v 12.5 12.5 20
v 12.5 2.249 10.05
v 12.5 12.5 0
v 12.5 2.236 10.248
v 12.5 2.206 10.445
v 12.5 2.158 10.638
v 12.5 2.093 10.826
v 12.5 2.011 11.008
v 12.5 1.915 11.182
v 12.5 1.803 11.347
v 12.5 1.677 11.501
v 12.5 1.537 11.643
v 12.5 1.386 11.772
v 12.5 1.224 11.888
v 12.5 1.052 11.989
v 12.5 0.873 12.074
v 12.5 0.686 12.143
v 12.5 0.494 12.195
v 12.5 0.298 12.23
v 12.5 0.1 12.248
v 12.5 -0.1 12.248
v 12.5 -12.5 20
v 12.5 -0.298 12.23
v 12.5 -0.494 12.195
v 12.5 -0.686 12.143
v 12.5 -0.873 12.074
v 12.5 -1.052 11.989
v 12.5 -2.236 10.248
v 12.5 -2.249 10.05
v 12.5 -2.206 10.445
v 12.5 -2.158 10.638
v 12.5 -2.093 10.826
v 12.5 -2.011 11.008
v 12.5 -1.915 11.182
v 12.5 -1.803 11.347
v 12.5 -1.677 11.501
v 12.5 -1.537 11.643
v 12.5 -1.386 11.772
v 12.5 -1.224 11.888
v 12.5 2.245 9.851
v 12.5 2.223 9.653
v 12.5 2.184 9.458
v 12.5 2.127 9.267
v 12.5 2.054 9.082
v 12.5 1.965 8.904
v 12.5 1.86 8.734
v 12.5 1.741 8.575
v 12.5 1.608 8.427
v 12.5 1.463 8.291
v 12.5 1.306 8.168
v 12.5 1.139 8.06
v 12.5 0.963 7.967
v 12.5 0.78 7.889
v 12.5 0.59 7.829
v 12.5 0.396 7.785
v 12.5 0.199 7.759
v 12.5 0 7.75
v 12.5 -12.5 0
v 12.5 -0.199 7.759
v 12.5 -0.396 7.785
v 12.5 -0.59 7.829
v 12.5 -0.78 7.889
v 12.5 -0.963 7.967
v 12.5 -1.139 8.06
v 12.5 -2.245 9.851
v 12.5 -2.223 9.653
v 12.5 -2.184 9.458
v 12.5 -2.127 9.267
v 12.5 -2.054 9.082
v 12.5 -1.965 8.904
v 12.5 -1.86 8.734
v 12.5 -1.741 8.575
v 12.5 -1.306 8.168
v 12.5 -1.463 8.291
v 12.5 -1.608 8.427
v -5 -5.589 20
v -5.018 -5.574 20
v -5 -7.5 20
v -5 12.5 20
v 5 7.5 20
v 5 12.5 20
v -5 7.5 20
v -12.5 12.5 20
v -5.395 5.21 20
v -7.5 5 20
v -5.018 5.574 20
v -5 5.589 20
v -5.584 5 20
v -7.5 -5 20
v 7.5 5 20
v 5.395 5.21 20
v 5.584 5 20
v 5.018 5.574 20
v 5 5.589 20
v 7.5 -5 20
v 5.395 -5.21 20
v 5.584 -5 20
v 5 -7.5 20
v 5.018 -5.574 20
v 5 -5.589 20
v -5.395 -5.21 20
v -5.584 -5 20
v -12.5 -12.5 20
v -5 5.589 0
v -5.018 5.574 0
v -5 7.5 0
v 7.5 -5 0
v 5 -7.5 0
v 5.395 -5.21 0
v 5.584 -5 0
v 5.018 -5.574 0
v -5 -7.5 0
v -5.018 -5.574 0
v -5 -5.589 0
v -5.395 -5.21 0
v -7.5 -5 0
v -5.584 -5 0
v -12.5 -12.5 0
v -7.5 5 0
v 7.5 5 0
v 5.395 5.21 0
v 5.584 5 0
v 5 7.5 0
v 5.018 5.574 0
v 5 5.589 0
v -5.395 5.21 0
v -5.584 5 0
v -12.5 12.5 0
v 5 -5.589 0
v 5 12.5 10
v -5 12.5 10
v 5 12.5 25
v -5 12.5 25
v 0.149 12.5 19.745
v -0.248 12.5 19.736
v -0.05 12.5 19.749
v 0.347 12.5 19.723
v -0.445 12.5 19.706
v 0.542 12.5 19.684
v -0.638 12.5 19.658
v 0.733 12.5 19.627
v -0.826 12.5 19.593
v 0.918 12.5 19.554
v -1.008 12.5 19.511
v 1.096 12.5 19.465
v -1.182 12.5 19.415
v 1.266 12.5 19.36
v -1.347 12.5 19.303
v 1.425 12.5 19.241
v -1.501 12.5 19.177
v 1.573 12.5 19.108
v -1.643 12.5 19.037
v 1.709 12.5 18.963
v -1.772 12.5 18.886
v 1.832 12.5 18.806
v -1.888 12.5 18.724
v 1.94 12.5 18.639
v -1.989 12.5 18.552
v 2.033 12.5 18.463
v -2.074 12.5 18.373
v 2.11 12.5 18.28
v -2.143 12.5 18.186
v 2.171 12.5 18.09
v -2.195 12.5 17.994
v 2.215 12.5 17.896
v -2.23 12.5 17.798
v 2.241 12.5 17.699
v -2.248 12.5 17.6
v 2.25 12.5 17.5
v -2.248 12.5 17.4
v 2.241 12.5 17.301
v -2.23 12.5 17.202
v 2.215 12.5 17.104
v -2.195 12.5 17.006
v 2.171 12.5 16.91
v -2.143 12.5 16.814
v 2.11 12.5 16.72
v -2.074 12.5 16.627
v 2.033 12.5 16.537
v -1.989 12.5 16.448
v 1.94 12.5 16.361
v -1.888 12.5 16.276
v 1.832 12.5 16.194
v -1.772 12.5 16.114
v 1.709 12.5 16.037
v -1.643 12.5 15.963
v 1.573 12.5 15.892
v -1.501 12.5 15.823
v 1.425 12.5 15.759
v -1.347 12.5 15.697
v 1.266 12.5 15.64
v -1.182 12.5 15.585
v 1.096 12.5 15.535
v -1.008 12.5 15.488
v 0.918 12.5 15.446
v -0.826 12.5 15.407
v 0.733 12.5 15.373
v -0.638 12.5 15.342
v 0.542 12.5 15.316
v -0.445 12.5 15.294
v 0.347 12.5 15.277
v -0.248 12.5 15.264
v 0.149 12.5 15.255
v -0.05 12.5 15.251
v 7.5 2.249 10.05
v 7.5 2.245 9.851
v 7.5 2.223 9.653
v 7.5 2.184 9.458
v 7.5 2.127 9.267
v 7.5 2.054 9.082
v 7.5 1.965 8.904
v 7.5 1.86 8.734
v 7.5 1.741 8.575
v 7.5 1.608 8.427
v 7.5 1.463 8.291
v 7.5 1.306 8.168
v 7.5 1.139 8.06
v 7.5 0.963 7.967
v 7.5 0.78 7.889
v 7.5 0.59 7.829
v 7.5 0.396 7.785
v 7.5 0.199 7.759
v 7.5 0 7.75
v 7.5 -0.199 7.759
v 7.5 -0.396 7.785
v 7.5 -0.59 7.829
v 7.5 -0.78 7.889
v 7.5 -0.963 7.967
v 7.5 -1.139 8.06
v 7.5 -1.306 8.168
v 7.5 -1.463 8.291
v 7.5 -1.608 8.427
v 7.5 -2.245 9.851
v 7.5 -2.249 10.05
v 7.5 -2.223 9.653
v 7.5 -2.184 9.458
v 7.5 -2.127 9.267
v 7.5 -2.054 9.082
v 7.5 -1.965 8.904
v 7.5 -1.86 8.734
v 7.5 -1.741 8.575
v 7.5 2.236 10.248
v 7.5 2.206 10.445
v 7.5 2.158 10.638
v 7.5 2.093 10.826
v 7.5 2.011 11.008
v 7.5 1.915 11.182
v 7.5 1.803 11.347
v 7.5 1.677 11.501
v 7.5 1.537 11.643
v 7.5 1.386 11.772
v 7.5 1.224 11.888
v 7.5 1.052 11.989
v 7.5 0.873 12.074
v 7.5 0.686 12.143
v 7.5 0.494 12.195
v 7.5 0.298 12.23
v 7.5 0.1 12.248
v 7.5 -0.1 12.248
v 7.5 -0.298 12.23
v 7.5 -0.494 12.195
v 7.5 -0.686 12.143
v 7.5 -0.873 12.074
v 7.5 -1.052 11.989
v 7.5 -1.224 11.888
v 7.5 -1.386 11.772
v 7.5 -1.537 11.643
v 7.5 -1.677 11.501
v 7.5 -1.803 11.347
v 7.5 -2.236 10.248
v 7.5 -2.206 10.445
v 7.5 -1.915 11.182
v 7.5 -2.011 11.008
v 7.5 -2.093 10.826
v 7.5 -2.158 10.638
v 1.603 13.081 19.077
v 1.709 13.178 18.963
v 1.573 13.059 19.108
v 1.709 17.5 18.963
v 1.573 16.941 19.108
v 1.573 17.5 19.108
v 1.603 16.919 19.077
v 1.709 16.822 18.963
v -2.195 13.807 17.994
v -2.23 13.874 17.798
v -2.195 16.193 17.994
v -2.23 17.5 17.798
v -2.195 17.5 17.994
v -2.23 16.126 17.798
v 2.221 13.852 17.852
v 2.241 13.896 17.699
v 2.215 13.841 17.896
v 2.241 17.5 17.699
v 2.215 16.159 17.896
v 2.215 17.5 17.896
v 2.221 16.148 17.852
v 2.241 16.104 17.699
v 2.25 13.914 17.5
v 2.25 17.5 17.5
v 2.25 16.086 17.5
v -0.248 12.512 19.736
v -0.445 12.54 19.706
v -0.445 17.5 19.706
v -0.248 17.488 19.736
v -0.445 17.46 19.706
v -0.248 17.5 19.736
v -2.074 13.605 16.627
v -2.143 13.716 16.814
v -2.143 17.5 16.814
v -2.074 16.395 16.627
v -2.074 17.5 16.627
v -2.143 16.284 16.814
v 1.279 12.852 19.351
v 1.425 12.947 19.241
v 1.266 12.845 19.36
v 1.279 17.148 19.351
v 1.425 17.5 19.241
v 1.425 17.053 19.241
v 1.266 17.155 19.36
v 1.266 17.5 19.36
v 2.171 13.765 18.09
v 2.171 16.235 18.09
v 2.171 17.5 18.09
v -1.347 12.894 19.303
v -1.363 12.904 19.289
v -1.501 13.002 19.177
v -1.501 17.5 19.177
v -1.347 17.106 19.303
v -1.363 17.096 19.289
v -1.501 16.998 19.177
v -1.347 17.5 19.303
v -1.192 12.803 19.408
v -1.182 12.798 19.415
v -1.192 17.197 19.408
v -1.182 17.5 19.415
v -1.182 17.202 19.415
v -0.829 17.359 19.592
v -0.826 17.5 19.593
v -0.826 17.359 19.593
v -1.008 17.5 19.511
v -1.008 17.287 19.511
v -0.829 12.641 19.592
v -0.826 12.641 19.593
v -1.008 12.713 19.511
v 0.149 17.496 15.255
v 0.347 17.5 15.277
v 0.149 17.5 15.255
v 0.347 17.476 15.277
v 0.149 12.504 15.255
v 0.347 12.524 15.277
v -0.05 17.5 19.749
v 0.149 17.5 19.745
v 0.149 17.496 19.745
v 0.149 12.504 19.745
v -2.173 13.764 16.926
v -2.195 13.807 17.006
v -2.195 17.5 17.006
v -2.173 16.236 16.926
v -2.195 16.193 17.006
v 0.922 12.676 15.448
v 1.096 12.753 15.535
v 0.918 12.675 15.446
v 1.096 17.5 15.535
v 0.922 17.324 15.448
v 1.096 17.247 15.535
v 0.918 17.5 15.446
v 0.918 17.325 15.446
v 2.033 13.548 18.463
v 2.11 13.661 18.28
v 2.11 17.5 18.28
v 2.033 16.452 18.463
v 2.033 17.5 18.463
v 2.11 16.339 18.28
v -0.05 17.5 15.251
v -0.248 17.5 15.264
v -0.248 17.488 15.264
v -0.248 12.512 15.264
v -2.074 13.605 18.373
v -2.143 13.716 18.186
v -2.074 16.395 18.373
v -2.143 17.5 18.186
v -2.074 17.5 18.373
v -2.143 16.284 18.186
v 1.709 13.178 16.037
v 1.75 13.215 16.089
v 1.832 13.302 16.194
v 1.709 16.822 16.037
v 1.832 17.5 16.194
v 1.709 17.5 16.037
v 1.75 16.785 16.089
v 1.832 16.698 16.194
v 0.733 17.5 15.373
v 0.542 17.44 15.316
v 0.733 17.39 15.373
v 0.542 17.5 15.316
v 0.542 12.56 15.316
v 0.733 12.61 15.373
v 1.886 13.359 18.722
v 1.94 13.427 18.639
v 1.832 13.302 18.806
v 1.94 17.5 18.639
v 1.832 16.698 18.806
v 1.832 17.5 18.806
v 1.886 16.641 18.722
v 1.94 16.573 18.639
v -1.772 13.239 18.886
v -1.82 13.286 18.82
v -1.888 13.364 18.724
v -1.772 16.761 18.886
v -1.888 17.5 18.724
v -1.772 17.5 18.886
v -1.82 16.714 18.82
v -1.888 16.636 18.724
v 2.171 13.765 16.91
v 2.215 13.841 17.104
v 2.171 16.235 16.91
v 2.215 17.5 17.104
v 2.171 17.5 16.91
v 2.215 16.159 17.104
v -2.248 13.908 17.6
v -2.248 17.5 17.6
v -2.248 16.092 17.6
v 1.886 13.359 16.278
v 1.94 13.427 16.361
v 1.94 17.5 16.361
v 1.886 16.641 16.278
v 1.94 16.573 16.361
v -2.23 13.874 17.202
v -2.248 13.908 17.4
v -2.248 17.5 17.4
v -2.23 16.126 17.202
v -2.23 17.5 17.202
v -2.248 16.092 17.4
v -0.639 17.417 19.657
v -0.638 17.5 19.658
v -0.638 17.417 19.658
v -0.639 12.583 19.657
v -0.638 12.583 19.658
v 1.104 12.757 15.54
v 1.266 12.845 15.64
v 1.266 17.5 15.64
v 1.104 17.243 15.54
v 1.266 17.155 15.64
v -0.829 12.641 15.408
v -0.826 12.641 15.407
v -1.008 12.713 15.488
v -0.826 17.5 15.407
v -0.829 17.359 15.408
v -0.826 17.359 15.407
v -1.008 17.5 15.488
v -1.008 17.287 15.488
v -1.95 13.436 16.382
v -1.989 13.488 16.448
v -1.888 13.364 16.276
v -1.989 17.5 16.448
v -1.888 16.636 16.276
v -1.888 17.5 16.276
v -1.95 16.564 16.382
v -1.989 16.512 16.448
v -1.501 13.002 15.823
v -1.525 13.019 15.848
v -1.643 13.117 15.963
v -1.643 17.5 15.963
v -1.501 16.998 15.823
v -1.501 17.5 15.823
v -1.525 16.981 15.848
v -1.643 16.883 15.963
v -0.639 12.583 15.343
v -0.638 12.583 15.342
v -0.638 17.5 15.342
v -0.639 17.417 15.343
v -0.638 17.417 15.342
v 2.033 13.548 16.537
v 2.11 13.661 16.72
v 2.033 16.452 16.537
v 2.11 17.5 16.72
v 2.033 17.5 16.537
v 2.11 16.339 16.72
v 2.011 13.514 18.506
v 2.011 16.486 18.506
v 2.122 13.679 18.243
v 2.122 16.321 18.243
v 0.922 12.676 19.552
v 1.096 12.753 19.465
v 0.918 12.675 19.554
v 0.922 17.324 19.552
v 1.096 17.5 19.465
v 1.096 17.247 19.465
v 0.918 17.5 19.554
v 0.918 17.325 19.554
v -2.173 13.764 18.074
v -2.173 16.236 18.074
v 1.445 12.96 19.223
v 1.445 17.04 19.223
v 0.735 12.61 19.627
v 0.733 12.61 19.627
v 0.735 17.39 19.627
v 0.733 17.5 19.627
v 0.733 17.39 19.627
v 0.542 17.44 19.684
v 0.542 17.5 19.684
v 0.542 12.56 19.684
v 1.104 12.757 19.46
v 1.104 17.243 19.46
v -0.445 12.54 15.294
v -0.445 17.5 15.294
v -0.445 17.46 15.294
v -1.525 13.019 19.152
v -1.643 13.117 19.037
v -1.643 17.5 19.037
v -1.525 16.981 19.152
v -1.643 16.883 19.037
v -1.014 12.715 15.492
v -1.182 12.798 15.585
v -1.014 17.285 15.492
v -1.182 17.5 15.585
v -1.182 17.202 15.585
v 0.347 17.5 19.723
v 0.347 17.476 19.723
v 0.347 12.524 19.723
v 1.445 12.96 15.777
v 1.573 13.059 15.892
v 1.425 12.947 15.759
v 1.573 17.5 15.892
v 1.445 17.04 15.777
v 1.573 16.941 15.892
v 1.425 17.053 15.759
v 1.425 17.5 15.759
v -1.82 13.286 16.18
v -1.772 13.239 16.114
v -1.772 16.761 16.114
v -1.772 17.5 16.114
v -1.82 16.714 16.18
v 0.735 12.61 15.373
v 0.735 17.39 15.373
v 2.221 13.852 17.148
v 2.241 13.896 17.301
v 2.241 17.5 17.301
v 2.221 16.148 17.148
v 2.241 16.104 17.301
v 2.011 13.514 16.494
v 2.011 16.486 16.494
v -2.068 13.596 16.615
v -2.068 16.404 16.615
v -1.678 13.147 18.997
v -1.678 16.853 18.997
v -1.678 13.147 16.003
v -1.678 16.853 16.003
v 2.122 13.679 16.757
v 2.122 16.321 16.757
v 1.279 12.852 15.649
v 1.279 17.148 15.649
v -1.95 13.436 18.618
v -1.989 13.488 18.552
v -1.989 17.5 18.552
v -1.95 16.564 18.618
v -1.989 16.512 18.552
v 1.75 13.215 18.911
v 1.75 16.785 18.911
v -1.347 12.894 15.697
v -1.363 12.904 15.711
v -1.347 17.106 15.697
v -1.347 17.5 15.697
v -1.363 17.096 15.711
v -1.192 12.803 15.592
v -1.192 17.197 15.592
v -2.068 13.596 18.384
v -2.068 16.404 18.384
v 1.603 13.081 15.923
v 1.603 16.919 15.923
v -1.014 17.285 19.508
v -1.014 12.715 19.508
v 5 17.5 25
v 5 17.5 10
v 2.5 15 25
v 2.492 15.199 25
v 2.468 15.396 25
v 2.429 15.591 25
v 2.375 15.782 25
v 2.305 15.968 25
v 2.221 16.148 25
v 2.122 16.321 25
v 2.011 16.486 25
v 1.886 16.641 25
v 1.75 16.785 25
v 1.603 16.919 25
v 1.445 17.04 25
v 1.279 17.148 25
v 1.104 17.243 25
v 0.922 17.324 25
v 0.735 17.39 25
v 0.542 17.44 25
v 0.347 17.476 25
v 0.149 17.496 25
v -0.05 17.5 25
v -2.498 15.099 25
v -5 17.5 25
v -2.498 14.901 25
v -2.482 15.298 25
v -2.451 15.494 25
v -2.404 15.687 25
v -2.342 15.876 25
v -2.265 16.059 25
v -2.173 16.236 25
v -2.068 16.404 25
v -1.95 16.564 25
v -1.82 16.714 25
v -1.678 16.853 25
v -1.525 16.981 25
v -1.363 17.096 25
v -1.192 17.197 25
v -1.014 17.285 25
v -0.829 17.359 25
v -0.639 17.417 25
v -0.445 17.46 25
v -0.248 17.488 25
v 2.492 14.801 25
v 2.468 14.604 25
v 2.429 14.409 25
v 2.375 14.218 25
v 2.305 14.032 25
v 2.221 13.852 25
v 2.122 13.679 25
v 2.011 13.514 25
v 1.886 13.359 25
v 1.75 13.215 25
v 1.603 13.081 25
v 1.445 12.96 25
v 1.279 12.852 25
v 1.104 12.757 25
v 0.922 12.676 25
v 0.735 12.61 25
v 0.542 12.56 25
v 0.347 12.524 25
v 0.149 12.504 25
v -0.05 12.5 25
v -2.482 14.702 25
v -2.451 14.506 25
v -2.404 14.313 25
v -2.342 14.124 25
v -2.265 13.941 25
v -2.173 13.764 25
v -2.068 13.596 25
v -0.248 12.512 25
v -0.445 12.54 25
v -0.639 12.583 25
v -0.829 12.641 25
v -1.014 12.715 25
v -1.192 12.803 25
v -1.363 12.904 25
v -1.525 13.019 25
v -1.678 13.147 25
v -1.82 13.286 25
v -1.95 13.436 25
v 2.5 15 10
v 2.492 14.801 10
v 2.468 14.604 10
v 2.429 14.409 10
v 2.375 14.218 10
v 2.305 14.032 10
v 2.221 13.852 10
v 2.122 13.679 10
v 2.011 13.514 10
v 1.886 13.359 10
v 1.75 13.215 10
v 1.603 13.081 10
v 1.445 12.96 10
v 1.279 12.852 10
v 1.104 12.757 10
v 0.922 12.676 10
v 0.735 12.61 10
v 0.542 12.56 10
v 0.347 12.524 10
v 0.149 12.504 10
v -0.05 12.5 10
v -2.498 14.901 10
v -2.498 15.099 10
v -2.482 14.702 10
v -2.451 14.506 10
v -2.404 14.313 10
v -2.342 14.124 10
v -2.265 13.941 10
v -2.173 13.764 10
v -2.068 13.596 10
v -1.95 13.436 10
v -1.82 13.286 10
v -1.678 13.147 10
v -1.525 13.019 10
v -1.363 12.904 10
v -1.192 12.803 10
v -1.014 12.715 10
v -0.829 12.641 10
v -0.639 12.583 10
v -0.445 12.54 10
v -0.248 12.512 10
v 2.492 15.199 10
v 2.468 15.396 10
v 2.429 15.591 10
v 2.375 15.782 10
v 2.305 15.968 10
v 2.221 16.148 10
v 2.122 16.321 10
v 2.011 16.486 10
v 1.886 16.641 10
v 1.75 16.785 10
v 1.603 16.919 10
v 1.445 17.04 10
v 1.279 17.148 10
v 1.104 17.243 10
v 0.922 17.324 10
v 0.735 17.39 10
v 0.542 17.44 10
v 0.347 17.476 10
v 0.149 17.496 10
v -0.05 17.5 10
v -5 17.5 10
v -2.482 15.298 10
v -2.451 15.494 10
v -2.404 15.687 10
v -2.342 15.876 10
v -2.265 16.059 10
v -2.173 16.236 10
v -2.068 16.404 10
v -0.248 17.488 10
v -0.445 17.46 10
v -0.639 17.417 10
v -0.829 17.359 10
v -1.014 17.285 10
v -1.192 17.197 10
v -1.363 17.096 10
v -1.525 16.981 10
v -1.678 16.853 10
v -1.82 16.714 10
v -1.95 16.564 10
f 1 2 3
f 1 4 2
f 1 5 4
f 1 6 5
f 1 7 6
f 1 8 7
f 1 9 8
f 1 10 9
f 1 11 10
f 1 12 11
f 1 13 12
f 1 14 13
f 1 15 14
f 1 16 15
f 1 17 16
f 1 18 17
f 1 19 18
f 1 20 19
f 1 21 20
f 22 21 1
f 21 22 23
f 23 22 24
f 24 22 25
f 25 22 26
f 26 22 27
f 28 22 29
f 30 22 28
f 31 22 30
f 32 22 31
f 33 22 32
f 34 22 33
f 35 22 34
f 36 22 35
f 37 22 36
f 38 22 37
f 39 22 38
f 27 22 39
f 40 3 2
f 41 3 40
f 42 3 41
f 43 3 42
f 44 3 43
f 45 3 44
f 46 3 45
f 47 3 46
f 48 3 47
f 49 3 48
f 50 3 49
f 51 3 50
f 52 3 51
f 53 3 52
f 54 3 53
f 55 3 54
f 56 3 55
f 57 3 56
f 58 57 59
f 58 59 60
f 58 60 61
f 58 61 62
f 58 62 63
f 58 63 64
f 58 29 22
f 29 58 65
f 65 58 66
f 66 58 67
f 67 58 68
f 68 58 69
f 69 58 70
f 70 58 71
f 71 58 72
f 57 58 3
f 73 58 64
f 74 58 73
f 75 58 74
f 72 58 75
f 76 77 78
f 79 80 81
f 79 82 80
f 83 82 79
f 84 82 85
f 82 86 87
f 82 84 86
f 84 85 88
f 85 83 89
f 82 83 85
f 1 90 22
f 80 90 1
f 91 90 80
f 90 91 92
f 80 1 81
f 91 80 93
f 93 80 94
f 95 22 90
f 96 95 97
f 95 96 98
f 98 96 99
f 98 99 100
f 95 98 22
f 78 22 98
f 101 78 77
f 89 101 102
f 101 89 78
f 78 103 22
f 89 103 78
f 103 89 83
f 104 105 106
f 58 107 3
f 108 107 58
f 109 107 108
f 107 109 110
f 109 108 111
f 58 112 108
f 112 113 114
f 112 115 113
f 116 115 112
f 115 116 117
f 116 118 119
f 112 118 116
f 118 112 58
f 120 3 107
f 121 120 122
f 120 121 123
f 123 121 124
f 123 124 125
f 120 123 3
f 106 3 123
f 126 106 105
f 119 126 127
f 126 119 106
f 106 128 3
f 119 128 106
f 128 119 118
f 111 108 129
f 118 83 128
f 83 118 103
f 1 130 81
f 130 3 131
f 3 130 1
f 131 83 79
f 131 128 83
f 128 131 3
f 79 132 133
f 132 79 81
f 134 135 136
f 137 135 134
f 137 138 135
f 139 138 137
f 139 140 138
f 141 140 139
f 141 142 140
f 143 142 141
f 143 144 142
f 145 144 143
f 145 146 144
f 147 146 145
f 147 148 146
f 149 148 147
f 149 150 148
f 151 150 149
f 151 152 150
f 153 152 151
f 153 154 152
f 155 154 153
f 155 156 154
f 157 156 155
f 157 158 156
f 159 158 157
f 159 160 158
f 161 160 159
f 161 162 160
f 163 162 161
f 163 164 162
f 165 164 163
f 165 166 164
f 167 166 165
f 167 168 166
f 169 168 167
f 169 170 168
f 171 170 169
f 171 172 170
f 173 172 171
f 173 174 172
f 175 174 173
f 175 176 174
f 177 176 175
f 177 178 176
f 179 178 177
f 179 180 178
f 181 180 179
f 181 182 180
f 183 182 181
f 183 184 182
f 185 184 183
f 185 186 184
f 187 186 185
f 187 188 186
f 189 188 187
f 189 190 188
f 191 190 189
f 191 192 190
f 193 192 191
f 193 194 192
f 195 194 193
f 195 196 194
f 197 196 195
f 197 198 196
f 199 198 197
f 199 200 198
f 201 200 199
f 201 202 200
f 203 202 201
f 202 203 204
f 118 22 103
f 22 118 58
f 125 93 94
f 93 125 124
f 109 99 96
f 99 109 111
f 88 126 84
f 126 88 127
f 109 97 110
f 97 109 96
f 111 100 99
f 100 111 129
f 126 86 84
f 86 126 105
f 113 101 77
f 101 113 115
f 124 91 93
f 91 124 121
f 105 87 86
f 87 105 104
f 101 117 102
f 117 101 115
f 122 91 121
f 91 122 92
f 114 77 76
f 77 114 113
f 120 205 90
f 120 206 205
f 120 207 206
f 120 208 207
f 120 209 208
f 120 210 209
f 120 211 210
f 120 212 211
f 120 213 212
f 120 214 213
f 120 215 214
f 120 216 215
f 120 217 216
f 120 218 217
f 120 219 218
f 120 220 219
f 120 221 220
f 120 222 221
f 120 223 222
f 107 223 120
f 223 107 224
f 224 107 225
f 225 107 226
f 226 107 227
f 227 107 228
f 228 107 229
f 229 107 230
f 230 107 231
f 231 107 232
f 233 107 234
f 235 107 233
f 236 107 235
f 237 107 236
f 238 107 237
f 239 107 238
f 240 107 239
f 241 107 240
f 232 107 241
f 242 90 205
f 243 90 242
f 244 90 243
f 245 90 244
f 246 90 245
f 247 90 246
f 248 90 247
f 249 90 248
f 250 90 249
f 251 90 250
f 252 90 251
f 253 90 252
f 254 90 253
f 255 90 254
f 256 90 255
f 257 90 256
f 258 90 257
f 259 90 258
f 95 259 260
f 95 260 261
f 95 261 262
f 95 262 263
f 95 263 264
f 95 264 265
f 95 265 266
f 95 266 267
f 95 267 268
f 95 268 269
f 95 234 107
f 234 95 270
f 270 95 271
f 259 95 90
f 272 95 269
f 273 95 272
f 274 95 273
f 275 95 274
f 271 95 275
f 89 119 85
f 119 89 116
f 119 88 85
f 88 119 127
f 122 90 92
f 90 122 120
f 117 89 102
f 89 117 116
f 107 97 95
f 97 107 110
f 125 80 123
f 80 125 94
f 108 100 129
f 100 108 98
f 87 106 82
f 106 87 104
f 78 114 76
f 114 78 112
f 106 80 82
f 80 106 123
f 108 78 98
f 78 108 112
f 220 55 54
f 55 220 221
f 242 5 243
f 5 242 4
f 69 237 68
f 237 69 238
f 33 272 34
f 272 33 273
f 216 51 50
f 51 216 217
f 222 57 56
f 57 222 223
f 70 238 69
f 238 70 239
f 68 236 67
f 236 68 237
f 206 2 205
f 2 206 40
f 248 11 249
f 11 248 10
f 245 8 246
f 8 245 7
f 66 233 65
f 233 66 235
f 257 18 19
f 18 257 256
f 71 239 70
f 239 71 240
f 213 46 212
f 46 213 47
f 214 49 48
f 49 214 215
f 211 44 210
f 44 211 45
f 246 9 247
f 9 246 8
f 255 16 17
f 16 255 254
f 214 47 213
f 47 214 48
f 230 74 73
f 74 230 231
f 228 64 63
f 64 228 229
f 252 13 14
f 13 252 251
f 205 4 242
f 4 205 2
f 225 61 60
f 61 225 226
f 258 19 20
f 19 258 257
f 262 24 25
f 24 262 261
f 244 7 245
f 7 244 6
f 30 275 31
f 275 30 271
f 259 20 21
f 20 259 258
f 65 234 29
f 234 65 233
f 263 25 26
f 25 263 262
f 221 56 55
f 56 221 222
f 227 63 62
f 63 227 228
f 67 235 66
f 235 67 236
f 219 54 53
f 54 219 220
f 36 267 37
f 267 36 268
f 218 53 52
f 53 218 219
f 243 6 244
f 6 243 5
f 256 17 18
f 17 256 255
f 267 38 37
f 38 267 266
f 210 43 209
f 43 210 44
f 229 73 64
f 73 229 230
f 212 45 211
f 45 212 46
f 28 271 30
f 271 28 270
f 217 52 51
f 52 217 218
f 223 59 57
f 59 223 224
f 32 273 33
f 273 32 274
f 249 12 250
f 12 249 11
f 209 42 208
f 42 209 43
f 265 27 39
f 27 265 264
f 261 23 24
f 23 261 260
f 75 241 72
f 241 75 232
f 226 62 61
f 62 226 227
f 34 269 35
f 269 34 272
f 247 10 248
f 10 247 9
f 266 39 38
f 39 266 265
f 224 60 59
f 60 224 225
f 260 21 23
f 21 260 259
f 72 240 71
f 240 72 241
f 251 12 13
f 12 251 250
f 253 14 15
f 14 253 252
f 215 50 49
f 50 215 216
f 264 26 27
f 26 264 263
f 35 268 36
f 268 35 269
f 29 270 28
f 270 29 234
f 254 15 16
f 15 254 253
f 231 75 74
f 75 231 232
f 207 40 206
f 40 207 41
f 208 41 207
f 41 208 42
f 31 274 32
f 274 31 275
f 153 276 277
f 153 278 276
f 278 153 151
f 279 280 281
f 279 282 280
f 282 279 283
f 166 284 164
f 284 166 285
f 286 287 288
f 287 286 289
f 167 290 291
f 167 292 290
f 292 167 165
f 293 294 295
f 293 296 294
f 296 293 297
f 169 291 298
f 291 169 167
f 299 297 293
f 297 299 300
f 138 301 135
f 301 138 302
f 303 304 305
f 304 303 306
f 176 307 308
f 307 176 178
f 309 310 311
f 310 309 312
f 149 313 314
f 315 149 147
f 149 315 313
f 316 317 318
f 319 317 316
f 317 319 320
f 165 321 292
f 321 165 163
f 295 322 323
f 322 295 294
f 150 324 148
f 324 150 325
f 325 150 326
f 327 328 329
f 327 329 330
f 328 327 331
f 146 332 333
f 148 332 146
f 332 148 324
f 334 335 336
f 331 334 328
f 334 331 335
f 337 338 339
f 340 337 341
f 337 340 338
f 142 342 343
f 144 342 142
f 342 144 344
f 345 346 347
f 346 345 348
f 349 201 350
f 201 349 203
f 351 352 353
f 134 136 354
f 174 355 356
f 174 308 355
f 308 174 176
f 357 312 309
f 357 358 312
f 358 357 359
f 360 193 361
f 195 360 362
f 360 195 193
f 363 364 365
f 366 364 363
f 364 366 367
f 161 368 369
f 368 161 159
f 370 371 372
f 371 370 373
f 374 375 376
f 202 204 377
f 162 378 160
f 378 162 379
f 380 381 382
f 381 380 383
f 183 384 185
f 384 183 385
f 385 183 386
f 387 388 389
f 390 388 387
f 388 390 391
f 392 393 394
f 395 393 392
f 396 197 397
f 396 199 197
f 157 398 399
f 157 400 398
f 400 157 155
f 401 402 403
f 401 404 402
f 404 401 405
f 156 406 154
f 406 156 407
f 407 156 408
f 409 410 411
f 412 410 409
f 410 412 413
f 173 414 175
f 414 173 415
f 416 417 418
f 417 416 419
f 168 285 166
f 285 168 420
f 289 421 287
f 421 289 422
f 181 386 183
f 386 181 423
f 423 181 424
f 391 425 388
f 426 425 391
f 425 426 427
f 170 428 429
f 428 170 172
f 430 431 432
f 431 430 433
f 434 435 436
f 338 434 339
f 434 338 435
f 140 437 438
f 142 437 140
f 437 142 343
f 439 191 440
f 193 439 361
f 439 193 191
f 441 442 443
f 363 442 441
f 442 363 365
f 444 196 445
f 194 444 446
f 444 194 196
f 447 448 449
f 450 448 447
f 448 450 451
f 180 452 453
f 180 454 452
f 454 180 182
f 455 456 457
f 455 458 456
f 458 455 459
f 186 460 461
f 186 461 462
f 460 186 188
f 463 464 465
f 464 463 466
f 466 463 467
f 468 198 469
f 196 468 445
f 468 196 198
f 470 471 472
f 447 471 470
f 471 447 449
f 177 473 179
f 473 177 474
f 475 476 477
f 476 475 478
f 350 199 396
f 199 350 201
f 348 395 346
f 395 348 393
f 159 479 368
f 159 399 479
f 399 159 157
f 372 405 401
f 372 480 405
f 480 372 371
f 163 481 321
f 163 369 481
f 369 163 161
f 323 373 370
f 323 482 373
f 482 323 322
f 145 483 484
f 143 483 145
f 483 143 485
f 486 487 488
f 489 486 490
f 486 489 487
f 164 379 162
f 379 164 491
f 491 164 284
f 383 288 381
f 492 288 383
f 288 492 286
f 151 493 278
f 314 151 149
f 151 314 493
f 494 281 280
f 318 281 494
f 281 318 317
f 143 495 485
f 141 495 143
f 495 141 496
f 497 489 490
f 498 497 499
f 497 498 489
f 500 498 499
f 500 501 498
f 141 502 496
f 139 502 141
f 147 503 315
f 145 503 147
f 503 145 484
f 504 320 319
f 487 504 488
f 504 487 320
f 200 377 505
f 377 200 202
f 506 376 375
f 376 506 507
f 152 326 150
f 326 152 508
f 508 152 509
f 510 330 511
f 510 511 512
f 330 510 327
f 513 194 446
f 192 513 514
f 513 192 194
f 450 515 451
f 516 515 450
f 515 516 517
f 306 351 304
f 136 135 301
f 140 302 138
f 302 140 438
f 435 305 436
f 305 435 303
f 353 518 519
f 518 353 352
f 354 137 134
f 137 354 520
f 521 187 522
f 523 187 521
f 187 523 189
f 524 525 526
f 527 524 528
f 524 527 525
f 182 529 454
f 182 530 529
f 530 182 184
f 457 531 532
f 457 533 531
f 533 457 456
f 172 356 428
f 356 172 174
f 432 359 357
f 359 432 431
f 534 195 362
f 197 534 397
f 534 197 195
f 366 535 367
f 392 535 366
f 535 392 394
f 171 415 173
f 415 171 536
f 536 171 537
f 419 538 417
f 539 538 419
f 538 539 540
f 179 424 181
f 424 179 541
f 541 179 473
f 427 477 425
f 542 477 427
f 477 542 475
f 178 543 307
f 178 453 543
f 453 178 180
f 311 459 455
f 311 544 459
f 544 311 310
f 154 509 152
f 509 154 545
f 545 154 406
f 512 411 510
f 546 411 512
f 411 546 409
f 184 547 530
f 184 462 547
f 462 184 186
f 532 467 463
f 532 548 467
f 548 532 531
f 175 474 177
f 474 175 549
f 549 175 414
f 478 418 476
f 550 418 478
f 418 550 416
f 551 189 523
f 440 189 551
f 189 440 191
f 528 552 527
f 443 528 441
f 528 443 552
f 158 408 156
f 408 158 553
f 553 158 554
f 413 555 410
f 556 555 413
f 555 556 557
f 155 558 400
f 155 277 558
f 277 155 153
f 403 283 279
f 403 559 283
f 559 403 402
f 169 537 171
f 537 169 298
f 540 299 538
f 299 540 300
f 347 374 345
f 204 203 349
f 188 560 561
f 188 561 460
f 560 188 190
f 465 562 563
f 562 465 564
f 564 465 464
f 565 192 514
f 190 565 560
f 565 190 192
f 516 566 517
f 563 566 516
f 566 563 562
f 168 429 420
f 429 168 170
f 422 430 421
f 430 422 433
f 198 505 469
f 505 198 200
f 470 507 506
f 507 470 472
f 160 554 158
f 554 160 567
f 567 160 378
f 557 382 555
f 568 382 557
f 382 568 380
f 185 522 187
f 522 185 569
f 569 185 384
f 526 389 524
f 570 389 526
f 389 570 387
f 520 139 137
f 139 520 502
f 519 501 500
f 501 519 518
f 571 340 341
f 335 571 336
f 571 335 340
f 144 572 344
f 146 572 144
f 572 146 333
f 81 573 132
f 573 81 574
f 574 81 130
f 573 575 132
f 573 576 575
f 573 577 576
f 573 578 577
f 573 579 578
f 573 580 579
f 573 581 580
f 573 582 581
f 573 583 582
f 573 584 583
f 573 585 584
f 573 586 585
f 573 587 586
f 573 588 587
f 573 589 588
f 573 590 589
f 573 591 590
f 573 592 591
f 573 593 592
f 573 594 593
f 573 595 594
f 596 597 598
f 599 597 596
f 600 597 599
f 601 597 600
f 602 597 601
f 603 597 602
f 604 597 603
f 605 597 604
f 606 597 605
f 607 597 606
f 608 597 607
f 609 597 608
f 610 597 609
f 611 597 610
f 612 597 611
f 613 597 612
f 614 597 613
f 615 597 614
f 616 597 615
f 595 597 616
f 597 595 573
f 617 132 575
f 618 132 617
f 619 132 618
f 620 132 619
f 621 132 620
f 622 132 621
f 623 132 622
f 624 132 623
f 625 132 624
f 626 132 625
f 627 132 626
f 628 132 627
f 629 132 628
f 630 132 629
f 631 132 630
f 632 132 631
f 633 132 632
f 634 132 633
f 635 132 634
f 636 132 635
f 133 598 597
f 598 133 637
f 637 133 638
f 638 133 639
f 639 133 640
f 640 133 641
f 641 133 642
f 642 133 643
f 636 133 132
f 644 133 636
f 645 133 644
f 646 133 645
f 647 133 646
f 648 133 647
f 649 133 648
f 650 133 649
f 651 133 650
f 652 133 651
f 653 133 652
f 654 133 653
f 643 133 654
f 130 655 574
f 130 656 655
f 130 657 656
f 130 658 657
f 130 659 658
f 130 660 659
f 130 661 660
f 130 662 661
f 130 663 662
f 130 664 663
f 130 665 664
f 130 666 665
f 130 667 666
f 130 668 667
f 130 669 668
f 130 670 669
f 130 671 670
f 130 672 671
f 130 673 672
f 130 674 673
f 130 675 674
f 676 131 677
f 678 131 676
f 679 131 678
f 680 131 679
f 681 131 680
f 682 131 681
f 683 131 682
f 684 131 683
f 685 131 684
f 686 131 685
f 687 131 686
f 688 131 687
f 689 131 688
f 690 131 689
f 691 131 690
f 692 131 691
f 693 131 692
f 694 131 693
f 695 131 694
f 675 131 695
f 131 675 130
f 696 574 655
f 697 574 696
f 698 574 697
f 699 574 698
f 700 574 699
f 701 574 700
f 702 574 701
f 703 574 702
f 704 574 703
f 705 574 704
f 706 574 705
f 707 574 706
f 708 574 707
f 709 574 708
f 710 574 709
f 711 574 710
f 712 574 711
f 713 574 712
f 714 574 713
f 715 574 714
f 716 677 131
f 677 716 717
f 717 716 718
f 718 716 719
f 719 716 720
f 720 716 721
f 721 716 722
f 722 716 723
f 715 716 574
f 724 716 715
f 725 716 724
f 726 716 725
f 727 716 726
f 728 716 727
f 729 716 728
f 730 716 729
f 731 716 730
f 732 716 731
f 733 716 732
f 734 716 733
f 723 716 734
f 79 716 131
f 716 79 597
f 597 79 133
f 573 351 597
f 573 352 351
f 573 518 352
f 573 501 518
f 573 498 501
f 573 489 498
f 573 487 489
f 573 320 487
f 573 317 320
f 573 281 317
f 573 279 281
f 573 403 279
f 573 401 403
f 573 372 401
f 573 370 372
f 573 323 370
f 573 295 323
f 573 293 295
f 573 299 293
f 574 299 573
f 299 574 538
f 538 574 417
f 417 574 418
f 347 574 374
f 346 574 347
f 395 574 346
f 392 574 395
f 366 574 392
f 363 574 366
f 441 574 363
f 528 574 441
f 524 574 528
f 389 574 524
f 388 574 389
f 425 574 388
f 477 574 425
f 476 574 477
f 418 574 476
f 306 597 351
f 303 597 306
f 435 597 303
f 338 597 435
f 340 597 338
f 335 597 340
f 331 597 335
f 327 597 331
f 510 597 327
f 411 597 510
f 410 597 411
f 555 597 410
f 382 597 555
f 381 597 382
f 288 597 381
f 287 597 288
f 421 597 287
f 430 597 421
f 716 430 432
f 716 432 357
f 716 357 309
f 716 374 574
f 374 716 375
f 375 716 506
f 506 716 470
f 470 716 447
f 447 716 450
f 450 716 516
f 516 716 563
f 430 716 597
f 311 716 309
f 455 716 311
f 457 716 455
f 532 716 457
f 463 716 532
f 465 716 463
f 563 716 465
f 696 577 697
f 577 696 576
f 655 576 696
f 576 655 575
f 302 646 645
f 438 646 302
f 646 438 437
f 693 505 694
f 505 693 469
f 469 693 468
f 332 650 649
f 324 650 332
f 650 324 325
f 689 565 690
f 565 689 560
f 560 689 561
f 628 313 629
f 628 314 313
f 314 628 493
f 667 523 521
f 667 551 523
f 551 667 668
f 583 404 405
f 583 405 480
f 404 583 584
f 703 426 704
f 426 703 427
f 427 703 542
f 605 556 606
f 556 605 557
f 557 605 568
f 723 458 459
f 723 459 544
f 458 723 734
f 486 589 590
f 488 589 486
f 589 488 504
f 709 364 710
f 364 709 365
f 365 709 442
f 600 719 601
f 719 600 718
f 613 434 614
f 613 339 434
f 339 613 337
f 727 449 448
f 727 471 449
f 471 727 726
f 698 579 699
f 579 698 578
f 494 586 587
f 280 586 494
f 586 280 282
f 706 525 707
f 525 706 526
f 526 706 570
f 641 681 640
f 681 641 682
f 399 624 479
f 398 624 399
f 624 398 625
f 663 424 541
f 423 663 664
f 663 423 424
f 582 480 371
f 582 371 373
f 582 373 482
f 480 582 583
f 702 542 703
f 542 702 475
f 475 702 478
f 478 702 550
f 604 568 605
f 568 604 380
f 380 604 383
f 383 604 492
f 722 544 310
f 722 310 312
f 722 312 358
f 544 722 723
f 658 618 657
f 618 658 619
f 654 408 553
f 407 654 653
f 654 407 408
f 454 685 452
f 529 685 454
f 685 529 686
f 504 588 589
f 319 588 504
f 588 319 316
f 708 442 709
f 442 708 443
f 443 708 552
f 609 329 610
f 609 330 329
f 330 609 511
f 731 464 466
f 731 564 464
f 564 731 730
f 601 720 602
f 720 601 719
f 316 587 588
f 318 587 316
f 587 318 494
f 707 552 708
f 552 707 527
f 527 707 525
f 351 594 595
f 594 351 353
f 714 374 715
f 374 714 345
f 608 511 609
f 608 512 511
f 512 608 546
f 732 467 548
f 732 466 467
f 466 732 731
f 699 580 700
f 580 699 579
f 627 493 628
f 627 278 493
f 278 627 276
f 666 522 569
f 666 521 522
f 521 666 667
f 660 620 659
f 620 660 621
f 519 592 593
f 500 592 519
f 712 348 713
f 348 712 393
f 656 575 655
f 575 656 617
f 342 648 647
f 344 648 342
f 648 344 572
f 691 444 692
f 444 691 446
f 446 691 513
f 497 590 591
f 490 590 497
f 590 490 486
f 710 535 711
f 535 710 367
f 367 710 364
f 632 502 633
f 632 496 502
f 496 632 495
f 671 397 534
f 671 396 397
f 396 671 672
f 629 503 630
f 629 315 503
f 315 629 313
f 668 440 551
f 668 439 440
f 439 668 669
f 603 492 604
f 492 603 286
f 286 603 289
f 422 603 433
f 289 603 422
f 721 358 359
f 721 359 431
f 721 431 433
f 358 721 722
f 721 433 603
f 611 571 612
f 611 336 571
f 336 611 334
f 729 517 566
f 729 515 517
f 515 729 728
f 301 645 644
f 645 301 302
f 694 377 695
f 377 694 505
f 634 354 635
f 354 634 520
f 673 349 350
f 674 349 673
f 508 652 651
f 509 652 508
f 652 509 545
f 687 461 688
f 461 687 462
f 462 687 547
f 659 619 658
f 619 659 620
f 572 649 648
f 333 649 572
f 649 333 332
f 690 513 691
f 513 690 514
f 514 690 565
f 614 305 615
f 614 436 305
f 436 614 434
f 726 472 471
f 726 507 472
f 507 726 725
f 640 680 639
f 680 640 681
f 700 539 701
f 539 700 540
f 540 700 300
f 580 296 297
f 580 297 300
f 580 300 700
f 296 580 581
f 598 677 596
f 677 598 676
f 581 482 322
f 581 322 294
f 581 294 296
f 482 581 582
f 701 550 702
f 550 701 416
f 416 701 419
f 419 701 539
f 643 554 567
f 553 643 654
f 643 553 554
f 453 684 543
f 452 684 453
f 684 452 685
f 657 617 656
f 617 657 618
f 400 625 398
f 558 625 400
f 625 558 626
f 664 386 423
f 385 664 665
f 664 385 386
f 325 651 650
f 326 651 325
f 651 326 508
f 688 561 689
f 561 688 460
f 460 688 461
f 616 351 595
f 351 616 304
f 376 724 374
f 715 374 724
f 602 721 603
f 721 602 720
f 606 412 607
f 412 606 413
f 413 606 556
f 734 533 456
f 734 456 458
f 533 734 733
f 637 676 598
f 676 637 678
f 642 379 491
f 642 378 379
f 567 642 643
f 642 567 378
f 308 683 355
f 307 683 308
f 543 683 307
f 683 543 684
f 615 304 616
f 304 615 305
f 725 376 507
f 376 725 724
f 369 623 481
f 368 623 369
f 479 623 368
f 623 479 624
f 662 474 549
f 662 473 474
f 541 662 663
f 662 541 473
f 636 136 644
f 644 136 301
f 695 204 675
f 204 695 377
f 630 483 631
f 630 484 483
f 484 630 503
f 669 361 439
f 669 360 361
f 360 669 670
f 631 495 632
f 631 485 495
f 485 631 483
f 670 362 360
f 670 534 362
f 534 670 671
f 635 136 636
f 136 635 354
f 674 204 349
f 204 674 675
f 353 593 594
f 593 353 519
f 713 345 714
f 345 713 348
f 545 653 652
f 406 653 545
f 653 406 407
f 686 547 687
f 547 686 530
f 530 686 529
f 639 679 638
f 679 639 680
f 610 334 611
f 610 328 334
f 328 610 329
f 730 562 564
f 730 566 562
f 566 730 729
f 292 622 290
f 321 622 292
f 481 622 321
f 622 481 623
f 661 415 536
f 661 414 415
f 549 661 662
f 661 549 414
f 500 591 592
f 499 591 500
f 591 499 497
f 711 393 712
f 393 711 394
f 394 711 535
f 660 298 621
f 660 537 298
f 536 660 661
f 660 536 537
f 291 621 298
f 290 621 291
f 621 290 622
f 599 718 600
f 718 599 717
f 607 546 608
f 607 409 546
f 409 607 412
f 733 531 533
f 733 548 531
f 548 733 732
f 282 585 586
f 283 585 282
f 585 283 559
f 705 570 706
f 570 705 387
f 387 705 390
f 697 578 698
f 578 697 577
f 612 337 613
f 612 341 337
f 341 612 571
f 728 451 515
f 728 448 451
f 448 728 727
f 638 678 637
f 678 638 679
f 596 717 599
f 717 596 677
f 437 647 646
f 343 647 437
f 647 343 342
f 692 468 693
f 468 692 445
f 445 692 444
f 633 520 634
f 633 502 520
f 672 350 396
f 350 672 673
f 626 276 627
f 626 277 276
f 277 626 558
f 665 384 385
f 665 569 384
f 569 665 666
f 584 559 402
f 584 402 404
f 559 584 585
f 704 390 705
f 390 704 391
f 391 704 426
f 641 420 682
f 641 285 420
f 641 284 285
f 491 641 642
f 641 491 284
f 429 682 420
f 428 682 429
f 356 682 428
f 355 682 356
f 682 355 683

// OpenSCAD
$fa = 4.0;
$fs = 0.2;

// Main dimensions
barrel_dia = 15;  // Paintball barrel diameter
laser_dia = 5;    // Laser module diameter
mount_height = 20; // Height of the main mount
mount_width = 25;  // Width of the main mount

// Adjustment mechanism dimensions
adjustment_range = 5;  // Maximum adjustment range in mm
insert_radius = 6/2;   // Threaded insert radius
screw_hole_r = 4.5/2;  // Screw hole radius
screw_head_r = 6/2;    // Screw head radius
screw_head_depth = 2;  // Screw head depth
insert_height = 6;     // Threaded insert height

// Laser mount dimensions
laser_mount_height = 15;
laser_mount_width = 10;
laser_mount_thickness = 5;

// Main mount
module main_mount() {
    difference() {
        // Main body
        translate([0, 0, mount_height/2])
            cube([mount_width, mount_width, mount_height], center=true);
        
        // Barrel hole
        translate([0, 0, -0.1])
            cylinder(h=mount_height+0.2, d=barrel_dia);
        
        // Adjustment slots
        // Vertical adjustment slot
        translate([0, 0, mount_height/2])
            cube([mount_width-10, adjustment_range*2, mount_height], center=true);
        
        // Horizontal adjustment slot
        translate([0, 0, mount_height/2])
            cube([adjustment_range*2, mount_width-10, mount_height], center=true);
        
        // Screw holes for adjustment
        // Vertical adjustment
        translate([0, mount_width/2-5, mount_height/2])
            rotate([90, 0, 0])
            cylinder(h=10, r=screw_hole_r);
        
        // Horizontal adjustment
        translate([mount_width/2-5, 0, mount_height/2])
            rotate([0, 90, 0])
            cylinder(h=10, r=screw_hole_r);
    }
}

// Laser mount
module laser_mount() {
    difference() {
        // Laser mount body
        translate([0, 0, laser_mount_height/2])
            cube([laser_mount_width, laser_mount_thickness, laser_mount_height], center=true);
        
        // Laser hole
        translate([0, 0, -0.1])
            cylinder(h=laser_mount_height+0.2, d=laser_dia);
        
        // Screw holes for mounting
        for(i = [-1, 1]) {
            translate([i*(laser_mount_width/2-5), 0, laser_mount_height/2])
                rotate([90, 0, 0])
                cylinder(h=laser_mount_thickness+0.2, r=screw_hole_r, center=true);
        }
    }
}

// Assembly
main_mount();
translate([0, mount_width/2 + laser_mount_thickness/2, mount_height/2])
    laser_mount(); 
